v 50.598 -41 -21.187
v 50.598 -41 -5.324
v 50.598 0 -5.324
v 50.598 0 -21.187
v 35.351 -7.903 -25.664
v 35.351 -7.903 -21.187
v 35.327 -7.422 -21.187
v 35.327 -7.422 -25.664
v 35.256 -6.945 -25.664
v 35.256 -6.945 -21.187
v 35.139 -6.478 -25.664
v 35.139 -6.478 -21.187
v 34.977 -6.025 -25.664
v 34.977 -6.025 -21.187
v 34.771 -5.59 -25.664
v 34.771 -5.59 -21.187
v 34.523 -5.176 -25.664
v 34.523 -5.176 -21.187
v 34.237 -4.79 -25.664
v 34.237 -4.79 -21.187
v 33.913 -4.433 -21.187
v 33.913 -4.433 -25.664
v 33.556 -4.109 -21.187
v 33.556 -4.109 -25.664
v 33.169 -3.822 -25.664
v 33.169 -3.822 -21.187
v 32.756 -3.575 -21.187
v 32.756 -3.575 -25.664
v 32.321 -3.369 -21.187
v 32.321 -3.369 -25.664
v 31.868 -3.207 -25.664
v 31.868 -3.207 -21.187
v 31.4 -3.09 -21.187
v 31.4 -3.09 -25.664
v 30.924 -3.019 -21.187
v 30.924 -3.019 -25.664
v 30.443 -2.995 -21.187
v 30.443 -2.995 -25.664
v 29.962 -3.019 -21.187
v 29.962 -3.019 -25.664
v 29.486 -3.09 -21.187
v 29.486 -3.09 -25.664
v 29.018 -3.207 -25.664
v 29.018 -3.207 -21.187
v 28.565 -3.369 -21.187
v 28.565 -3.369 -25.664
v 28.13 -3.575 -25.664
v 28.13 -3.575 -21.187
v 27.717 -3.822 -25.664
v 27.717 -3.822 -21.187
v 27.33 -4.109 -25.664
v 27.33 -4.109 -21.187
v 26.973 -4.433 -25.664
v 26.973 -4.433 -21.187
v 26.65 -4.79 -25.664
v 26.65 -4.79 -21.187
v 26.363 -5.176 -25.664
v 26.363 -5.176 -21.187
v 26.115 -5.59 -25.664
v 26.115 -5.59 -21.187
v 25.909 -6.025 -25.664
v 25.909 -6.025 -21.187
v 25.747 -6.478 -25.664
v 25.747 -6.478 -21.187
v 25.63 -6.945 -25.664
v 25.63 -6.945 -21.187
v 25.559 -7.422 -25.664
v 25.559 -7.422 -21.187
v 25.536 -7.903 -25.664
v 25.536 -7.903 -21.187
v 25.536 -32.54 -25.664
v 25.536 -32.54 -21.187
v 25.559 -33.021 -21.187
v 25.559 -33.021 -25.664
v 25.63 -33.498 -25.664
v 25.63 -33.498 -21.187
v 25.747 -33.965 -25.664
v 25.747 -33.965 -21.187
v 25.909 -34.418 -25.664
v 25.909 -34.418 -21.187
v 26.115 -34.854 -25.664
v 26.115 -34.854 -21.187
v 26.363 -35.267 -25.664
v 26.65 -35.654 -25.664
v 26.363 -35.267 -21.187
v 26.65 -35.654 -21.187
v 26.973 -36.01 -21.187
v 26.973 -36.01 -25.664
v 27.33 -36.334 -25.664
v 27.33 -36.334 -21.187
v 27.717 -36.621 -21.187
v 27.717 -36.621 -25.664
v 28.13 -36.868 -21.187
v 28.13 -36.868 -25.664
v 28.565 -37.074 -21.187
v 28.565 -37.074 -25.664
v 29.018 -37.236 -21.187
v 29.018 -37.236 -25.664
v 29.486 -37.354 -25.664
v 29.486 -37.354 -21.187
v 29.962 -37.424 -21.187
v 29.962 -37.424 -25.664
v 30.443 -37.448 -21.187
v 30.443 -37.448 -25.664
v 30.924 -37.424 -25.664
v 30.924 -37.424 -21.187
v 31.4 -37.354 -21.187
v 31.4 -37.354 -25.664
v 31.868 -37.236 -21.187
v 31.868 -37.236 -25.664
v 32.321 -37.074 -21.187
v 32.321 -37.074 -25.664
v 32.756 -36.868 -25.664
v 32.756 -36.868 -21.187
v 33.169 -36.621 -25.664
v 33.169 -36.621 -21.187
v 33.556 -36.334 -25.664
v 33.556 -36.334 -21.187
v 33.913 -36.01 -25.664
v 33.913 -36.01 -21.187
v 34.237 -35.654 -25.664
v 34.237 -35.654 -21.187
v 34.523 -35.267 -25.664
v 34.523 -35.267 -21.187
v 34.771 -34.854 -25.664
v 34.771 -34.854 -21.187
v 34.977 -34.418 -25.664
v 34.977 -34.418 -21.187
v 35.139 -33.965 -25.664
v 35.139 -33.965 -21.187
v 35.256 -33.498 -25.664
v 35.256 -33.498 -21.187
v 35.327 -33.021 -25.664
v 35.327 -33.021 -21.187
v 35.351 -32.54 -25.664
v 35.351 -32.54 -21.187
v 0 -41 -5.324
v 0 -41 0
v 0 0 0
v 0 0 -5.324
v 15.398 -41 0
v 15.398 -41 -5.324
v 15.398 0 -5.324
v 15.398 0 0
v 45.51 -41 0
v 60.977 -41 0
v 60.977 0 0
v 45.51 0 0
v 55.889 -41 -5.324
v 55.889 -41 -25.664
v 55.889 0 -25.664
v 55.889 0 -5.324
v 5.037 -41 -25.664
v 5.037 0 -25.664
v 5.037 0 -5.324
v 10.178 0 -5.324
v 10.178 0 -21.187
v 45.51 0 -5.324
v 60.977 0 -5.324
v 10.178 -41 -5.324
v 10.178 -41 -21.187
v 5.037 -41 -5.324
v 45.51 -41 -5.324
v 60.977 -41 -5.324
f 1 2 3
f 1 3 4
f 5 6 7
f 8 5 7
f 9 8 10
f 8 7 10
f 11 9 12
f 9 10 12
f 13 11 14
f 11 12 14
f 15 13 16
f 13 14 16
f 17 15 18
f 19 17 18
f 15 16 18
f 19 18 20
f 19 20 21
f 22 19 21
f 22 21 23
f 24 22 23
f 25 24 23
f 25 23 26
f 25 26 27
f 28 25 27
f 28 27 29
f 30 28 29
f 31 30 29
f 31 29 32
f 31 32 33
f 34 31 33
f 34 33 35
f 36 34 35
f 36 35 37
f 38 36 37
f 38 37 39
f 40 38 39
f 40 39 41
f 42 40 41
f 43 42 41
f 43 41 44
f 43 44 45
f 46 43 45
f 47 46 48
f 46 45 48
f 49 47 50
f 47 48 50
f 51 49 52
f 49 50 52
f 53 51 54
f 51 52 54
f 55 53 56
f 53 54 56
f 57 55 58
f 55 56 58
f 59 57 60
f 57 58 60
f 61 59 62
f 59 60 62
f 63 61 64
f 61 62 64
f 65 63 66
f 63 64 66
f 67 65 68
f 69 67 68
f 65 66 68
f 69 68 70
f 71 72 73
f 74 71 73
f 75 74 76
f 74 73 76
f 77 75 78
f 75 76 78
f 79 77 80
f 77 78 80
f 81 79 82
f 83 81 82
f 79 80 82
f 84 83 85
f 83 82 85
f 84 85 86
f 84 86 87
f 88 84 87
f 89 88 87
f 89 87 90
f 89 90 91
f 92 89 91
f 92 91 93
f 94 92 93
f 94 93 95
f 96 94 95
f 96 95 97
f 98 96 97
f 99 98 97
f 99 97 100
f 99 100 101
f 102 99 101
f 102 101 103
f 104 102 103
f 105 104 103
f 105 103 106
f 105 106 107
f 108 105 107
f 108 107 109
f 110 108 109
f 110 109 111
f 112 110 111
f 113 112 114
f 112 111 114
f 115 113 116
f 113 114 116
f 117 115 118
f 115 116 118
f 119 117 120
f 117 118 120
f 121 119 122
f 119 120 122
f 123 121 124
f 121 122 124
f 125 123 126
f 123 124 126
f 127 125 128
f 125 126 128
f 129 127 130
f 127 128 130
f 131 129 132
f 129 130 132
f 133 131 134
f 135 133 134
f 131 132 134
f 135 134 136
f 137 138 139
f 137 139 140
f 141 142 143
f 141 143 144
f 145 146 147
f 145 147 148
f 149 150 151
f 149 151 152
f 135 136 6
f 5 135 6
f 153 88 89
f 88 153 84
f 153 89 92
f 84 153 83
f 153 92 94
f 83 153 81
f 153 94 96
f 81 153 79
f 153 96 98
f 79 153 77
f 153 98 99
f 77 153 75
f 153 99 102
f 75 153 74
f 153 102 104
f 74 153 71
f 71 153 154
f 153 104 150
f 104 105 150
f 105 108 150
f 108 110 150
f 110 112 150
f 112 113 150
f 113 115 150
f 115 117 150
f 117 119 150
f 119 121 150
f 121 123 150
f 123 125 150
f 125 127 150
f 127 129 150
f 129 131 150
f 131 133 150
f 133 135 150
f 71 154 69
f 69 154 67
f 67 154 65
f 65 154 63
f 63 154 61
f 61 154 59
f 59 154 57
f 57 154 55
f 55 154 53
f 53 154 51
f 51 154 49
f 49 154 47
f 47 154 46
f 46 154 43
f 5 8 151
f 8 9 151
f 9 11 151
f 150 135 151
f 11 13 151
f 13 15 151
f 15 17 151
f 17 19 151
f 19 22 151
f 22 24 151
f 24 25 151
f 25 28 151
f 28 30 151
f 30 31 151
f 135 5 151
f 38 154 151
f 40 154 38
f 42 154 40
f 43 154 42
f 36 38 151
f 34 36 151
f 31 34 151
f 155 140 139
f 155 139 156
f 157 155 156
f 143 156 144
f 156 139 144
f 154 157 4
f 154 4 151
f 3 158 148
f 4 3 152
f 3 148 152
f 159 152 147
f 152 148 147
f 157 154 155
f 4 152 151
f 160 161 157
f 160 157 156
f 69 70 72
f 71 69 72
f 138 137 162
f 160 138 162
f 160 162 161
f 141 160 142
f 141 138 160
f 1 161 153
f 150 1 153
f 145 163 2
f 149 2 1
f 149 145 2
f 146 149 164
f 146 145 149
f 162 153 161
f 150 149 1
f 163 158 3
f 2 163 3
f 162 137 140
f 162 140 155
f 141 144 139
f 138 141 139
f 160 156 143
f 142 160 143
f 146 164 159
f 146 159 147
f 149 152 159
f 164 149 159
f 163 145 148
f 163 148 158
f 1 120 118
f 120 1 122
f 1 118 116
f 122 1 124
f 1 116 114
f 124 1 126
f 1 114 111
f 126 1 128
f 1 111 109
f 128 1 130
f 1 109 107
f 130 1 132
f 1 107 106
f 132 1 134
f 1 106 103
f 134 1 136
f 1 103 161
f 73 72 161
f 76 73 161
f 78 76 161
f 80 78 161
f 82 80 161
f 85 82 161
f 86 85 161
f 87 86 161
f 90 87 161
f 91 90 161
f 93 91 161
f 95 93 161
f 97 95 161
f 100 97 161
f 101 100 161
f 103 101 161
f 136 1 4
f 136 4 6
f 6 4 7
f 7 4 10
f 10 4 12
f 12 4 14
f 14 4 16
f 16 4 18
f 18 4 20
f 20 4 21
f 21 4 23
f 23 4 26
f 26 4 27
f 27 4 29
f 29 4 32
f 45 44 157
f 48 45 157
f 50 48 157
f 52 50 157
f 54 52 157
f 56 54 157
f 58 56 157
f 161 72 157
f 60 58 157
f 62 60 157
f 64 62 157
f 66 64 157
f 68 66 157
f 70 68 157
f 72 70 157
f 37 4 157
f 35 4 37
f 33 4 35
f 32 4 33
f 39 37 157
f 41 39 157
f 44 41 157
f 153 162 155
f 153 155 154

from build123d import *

# Parameters (mm, degrees)
F1_DEPTH = 41
F3_DEPTH = 25


with BuildPart() as f1:
    # F0 (on Front) → F1 (new body)
    with BuildSketch(Plane.XZ):
        Polygon((15.397609, 0), (0, 0), (0, -5.324407), (5.036601, -5.324407), (5.036601, -25.664302), (55.889241, -25.664302), (55.889241, -5.324407), (60.976975, -5.324407), (60.976975, 0), (45.510266, 0), (45.510266, -5.324407), (50.597999, -5.324407), (50.597999, -21.187095), (10.17818, -21.187095), (10.17818, -5.324407), (15.397609, -5.324407), align=None)
    extrude(amount=F1_DEPTH)

    # F2 (on face) → F3 (cut)
    with BuildSketch(Plane.XY.offset(-21.187095)):
        with BuildLine():
            ThreePointArc((35.350505, -7.902889), (30.443043, -2.995427), (25.535582, -7.902889))
            Line((25.535582, -7.902889), (25.535582, -32.540347))
            ThreePointArc((25.535582, -32.540347), (30.443043, -37.447809), (35.350505, -32.540347))
            Line((35.350505, -32.540347), (35.350505, -7.902889))
        make_face()
    extrude(amount=-F3_DEPTH, mode=Mode.SUBTRACT)


solid = f1.part
